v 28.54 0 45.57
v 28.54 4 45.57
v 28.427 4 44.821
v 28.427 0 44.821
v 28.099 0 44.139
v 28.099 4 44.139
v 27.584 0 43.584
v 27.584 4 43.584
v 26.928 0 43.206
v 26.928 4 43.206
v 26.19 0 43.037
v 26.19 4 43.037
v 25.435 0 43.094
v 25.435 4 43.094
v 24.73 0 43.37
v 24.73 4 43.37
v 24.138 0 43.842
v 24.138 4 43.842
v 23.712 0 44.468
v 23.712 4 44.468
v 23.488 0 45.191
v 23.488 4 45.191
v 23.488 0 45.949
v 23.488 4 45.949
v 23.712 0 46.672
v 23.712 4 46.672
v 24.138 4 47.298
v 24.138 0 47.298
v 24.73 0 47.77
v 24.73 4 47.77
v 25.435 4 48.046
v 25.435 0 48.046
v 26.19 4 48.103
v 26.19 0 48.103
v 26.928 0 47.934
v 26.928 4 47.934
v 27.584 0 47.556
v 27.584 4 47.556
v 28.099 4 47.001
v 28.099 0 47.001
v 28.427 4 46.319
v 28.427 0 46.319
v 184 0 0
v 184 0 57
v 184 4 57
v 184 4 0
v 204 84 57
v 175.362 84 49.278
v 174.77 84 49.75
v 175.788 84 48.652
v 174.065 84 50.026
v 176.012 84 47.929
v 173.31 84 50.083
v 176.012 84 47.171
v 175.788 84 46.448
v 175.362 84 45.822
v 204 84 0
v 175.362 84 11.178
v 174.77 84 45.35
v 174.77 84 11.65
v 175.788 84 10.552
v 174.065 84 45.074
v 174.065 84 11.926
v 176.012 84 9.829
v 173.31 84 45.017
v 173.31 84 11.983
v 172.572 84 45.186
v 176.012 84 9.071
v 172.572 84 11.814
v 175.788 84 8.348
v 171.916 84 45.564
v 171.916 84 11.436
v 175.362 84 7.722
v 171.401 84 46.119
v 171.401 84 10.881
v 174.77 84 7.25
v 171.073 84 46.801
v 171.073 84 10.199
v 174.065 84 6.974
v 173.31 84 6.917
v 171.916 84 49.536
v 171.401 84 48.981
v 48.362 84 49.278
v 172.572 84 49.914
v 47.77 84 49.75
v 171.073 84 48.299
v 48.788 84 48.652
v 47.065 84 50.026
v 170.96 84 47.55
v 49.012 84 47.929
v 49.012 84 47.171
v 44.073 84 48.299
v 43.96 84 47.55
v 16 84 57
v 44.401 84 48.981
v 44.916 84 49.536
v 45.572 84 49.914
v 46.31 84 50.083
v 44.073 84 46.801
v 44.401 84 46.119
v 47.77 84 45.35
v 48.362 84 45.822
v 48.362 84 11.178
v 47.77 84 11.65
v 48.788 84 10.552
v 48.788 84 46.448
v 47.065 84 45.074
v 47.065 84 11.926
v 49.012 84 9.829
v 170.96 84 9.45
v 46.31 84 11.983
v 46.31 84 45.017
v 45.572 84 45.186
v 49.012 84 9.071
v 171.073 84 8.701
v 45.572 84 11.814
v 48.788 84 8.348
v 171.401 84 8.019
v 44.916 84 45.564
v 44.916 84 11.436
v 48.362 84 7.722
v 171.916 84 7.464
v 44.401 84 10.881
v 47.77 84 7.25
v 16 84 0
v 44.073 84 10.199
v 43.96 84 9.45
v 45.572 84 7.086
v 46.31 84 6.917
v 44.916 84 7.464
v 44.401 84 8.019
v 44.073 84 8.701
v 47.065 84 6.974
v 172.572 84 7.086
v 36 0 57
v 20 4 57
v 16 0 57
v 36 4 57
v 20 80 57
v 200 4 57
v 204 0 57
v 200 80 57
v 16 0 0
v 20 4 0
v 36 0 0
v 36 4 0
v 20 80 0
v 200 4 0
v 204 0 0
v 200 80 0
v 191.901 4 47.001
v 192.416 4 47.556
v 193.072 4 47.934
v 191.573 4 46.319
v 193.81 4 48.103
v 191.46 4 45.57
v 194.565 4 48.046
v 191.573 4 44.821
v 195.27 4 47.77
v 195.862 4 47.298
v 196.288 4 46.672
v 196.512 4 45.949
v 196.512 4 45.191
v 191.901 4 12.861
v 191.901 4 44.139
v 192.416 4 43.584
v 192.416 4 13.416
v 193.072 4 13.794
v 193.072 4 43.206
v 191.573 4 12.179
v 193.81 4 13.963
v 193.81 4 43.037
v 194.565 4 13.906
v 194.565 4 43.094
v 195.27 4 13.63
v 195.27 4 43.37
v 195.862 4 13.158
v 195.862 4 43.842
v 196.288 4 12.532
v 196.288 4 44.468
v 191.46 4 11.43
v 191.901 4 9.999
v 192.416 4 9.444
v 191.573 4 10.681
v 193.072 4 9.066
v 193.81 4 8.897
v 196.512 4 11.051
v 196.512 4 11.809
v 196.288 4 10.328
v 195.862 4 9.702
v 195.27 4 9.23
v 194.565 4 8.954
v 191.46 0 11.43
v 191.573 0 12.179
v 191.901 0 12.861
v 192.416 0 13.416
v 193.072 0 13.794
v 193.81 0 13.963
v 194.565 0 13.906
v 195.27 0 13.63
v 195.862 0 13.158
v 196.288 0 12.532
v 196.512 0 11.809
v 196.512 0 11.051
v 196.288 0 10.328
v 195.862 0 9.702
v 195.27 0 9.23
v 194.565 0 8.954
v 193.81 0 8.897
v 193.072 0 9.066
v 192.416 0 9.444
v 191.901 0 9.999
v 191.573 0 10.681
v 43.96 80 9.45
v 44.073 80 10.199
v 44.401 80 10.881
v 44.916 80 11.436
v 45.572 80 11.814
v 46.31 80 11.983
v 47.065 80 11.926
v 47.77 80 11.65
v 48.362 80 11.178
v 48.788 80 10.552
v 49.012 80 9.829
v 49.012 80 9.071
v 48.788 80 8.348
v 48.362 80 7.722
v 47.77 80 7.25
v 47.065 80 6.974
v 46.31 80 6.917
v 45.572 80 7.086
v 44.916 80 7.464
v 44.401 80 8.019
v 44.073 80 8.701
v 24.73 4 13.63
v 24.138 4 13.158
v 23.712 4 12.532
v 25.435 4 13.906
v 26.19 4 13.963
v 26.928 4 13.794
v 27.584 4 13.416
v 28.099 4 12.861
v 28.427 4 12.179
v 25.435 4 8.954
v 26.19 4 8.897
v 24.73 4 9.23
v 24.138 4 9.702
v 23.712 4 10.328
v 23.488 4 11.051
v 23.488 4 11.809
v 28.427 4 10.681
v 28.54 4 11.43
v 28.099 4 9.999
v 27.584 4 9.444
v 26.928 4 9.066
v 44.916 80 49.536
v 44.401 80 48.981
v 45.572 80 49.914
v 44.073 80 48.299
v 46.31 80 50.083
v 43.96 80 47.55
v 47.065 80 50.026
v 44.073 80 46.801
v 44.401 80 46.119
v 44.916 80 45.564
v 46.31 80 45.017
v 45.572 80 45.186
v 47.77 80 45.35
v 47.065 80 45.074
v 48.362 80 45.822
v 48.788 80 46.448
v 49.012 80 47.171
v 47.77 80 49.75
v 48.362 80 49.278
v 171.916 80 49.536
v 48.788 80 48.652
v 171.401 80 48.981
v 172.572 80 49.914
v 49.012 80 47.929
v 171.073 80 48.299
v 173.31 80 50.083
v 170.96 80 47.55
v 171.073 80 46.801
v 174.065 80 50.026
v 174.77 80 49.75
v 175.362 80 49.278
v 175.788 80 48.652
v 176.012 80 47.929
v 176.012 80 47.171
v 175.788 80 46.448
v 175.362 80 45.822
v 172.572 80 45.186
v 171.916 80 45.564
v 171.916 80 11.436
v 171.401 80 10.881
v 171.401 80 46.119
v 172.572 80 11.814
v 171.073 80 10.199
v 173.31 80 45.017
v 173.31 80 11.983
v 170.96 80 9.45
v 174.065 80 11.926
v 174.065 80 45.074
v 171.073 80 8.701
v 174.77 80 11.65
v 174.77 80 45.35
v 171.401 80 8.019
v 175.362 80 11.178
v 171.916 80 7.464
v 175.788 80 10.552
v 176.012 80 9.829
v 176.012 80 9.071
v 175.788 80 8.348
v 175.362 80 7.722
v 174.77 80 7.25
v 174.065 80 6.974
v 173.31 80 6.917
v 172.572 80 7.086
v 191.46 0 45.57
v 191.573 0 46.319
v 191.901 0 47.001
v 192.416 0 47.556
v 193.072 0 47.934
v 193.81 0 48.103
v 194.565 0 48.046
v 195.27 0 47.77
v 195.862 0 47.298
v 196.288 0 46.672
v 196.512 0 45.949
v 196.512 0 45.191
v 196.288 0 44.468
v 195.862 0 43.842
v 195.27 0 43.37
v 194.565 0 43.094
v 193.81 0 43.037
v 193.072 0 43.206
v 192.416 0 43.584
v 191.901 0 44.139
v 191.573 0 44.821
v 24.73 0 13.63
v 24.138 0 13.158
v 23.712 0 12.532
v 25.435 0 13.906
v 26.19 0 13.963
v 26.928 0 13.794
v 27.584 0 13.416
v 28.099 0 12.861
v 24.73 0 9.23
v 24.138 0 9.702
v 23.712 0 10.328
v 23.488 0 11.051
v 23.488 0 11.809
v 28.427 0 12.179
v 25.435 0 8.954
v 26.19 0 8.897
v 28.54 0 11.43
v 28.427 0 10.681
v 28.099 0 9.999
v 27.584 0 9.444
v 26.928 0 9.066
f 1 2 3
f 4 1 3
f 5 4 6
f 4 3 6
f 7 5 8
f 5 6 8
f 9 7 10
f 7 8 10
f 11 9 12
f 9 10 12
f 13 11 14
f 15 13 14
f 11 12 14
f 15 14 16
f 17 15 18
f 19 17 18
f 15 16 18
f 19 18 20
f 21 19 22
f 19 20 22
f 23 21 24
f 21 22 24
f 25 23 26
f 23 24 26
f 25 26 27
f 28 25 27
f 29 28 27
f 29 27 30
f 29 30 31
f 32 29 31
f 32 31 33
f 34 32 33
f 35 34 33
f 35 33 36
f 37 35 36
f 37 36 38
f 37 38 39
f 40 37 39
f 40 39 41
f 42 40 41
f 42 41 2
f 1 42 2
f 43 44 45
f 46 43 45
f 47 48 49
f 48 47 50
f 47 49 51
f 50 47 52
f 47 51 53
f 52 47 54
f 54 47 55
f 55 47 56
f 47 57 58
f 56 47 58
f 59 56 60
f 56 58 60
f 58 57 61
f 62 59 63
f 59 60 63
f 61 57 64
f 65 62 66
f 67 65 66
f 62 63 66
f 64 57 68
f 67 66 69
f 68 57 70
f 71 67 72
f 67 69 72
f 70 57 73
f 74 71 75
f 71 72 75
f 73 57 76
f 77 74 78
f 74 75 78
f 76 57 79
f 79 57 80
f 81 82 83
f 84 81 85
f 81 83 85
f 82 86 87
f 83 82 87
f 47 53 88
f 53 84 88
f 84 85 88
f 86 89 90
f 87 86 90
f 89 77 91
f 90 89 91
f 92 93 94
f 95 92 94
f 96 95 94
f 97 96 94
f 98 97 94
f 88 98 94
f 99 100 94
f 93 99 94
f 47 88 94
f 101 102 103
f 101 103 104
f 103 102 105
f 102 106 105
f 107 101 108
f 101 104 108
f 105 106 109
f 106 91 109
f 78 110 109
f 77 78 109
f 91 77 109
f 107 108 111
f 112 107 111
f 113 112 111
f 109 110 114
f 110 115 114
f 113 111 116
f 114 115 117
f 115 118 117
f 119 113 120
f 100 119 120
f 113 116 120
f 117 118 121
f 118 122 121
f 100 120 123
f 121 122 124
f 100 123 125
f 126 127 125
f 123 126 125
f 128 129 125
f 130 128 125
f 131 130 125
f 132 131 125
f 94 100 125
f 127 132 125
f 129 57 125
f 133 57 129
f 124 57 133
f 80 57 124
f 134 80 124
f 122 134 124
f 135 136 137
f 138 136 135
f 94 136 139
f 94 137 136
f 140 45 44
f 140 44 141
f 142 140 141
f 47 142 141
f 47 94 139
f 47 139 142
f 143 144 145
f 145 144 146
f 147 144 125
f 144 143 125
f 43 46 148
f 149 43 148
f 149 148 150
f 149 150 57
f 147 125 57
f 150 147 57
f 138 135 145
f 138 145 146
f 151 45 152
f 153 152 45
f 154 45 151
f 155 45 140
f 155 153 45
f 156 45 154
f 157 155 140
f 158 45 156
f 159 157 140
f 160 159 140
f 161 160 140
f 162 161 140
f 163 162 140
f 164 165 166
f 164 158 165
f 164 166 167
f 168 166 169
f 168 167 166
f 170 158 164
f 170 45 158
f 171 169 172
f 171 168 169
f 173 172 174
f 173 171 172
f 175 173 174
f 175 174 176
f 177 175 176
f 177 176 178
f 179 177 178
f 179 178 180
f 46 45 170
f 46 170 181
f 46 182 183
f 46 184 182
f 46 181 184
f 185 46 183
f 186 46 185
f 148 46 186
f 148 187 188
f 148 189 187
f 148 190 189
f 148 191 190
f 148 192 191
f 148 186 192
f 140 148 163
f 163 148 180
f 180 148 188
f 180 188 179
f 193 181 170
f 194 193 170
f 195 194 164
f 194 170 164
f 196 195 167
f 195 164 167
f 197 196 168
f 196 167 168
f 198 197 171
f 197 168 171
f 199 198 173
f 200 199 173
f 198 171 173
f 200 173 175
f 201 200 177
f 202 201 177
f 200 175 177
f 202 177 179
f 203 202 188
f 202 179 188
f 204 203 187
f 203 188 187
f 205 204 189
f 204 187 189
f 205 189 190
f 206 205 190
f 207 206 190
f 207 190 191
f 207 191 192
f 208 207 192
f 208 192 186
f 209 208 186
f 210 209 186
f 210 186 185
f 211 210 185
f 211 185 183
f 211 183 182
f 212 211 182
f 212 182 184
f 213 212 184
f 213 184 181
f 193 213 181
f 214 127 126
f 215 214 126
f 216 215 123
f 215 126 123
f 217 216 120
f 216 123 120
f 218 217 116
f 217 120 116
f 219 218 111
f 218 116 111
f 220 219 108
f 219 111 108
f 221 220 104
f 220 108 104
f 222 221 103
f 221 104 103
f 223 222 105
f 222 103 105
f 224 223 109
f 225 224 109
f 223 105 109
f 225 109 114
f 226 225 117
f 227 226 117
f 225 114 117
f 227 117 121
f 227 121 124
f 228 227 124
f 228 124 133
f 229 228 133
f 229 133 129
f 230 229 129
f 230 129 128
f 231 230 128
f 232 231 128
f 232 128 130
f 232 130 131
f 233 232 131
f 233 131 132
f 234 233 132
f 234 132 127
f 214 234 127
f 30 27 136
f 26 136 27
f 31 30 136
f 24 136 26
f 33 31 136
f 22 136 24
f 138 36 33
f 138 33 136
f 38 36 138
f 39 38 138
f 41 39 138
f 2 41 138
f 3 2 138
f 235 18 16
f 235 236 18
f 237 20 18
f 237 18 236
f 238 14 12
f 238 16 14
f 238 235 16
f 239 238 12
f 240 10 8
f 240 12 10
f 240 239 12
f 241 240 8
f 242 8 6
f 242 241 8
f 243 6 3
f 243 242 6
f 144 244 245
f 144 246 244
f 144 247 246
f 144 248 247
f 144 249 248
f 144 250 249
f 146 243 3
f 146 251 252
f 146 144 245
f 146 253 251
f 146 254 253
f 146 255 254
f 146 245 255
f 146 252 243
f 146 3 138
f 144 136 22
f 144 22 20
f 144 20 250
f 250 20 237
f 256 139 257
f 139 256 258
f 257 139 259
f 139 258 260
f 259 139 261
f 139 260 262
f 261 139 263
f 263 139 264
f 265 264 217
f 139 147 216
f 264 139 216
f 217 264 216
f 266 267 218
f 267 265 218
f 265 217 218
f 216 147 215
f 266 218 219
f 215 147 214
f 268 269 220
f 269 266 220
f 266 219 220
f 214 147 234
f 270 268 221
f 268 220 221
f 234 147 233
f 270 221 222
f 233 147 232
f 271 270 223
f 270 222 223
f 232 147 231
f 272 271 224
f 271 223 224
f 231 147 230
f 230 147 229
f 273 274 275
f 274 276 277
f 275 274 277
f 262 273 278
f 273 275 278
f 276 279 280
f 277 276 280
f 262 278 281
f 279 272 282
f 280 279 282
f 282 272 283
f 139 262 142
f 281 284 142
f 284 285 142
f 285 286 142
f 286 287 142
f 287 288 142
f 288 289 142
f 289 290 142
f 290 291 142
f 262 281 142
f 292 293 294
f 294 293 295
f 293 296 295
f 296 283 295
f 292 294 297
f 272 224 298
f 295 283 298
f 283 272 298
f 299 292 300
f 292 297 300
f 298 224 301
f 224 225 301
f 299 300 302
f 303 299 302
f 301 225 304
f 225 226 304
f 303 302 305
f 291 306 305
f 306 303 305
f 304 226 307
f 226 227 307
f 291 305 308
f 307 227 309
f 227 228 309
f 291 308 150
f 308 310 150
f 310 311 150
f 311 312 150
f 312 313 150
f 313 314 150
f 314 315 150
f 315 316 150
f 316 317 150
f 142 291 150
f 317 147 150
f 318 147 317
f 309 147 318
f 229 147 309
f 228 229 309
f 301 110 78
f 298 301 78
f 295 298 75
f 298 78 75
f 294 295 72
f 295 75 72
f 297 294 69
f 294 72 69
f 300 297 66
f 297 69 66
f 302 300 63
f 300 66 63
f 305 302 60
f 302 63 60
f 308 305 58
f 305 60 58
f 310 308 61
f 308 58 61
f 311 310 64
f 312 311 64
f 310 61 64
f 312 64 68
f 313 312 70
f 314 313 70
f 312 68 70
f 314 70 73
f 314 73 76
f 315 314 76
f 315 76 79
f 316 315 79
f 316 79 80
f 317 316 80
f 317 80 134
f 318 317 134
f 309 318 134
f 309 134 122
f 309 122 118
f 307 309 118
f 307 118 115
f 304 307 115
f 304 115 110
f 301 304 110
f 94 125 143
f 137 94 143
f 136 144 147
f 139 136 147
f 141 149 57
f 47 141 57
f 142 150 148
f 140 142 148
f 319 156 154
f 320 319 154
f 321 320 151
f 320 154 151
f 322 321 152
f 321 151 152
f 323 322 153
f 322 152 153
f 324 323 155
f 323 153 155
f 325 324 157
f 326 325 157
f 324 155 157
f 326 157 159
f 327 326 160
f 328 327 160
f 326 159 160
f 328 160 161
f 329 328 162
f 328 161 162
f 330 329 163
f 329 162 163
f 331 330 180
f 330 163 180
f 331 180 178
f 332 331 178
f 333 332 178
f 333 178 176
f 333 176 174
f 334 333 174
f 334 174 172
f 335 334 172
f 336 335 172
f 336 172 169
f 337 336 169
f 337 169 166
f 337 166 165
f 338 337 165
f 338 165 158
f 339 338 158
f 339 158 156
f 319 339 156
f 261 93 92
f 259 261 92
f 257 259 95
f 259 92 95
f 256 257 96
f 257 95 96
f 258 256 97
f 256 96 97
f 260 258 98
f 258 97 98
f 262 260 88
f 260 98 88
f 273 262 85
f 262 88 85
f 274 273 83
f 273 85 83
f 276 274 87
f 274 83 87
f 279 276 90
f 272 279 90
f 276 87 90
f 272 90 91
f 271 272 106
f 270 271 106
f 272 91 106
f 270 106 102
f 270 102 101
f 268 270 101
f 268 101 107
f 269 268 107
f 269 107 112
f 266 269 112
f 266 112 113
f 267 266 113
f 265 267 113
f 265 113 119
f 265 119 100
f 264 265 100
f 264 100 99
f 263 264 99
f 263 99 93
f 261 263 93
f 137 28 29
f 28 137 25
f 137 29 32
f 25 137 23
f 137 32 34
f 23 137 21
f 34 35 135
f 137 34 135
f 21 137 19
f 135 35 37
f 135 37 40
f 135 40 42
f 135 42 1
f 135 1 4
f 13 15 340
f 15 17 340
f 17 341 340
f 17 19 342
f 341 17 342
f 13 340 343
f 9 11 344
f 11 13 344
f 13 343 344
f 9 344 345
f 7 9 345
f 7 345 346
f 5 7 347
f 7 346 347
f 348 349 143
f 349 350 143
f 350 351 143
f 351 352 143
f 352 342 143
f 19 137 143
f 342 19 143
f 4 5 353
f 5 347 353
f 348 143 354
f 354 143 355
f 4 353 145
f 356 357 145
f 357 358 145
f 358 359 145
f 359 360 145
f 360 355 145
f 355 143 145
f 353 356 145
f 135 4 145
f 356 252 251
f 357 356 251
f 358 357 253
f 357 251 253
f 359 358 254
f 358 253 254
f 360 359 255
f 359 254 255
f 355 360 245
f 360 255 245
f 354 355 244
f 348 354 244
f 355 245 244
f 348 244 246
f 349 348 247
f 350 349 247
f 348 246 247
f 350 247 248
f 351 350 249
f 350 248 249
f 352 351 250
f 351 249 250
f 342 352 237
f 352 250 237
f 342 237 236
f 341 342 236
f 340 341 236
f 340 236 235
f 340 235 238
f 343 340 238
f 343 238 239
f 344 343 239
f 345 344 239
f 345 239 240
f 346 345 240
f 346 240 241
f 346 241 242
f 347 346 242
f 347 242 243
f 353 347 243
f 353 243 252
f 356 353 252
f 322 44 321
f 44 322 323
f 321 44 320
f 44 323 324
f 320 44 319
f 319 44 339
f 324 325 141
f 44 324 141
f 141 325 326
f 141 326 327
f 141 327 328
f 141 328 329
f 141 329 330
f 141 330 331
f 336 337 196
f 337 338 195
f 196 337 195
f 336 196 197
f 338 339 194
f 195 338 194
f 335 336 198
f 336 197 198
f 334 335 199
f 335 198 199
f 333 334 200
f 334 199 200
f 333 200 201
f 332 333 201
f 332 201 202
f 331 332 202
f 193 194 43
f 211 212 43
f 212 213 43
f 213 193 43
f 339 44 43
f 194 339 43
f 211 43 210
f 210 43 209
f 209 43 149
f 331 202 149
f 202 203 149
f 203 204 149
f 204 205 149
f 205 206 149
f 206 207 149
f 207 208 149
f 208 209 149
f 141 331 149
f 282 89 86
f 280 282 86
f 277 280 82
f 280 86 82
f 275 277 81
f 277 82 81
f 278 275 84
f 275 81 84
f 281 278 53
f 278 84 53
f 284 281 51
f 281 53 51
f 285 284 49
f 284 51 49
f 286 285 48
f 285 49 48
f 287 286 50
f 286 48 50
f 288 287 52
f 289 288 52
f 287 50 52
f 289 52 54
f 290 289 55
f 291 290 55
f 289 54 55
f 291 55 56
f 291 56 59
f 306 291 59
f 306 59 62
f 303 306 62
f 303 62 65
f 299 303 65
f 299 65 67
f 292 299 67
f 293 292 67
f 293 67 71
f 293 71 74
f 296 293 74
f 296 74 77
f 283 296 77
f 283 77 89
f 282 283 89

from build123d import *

# Parameters (mm, degrees)
F0_W     = 16
F0_H     = 4
F1_DEPTH = 57
F3_R     = 2.54
F4_DEPTH = 4.001
F5_R     = 2.54
F6_DEPTH = 84.001


with BuildPart() as f1:
    # F0 (on Top) → F1 (new body)
    with BuildSketch(Plane.XY):
        with Locations((28, 2)):
            Rectangle(F0_W, F0_H)
        Polygon((16, 0), (20, 0), (20, 4), (20, 80), (200, 80), (200, 4), (200, 0), (204, 0), (204, 4), (204, 84), (16, 84), (16, 4), align=None)
        with Locations((192, 2)):
            Rectangle(F0_W, F0_H)
    extrude(amount=F1_DEPTH)

    # F2 (on face) + F3 (on face) → F4 (cut, through all)
    with BuildSketch(Plane(origin=(0, 4, 0), x_dir=(-1, 0, 0), z_dir=(0, 1, 0))):
        with BuildLine():
            ThreePointArc((-23.46, 11.43), (-26, 13.97), (-28.54, 11.43))
            ThreePointArc((-28.54, 11.43), (-26, 8.89), (-23.46, 11.43))
        make_face()
        with BuildLine():
            ThreePointArc((-23.46, 45.57), (-26, 48.11), (-28.54, 45.57))
            ThreePointArc((-28.54, 45.57), (-26, 43.03), (-23.46, 45.57))
        make_face()
    with BuildSketch(Plane(origin=(0, 4, 0), x_dir=(-1, 0, 0), z_dir=(0, 1, 0))):
        with Locations((-194, 11.43)):
            Circle(F3_R)
        with Locations((-194, 45.57)):
            Circle(F3_R)
    extrude(amount=-F4_DEPTH, mode=Mode.SUBTRACT)

    # F5 (on face) → F6 (cut, through all)
    with BuildSketch(Plane(origin=(0, 84, 0), x_dir=(-1, 0, 0), z_dir=(0, 1, 0))):
        with Locations((-173.5, 47.55)):
            Circle(F5_R)
        with Locations((-173.5, 9.45)):
            Circle(F5_R)
        with Locations((-46.5, 9.45)):
            Circle(F5_R)
        with Locations((-46.5, 47.55)):
            Circle(F5_R)
    extrude(amount=-F6_DEPTH, mode=Mode.SUBTRACT)


solid = f1.part
